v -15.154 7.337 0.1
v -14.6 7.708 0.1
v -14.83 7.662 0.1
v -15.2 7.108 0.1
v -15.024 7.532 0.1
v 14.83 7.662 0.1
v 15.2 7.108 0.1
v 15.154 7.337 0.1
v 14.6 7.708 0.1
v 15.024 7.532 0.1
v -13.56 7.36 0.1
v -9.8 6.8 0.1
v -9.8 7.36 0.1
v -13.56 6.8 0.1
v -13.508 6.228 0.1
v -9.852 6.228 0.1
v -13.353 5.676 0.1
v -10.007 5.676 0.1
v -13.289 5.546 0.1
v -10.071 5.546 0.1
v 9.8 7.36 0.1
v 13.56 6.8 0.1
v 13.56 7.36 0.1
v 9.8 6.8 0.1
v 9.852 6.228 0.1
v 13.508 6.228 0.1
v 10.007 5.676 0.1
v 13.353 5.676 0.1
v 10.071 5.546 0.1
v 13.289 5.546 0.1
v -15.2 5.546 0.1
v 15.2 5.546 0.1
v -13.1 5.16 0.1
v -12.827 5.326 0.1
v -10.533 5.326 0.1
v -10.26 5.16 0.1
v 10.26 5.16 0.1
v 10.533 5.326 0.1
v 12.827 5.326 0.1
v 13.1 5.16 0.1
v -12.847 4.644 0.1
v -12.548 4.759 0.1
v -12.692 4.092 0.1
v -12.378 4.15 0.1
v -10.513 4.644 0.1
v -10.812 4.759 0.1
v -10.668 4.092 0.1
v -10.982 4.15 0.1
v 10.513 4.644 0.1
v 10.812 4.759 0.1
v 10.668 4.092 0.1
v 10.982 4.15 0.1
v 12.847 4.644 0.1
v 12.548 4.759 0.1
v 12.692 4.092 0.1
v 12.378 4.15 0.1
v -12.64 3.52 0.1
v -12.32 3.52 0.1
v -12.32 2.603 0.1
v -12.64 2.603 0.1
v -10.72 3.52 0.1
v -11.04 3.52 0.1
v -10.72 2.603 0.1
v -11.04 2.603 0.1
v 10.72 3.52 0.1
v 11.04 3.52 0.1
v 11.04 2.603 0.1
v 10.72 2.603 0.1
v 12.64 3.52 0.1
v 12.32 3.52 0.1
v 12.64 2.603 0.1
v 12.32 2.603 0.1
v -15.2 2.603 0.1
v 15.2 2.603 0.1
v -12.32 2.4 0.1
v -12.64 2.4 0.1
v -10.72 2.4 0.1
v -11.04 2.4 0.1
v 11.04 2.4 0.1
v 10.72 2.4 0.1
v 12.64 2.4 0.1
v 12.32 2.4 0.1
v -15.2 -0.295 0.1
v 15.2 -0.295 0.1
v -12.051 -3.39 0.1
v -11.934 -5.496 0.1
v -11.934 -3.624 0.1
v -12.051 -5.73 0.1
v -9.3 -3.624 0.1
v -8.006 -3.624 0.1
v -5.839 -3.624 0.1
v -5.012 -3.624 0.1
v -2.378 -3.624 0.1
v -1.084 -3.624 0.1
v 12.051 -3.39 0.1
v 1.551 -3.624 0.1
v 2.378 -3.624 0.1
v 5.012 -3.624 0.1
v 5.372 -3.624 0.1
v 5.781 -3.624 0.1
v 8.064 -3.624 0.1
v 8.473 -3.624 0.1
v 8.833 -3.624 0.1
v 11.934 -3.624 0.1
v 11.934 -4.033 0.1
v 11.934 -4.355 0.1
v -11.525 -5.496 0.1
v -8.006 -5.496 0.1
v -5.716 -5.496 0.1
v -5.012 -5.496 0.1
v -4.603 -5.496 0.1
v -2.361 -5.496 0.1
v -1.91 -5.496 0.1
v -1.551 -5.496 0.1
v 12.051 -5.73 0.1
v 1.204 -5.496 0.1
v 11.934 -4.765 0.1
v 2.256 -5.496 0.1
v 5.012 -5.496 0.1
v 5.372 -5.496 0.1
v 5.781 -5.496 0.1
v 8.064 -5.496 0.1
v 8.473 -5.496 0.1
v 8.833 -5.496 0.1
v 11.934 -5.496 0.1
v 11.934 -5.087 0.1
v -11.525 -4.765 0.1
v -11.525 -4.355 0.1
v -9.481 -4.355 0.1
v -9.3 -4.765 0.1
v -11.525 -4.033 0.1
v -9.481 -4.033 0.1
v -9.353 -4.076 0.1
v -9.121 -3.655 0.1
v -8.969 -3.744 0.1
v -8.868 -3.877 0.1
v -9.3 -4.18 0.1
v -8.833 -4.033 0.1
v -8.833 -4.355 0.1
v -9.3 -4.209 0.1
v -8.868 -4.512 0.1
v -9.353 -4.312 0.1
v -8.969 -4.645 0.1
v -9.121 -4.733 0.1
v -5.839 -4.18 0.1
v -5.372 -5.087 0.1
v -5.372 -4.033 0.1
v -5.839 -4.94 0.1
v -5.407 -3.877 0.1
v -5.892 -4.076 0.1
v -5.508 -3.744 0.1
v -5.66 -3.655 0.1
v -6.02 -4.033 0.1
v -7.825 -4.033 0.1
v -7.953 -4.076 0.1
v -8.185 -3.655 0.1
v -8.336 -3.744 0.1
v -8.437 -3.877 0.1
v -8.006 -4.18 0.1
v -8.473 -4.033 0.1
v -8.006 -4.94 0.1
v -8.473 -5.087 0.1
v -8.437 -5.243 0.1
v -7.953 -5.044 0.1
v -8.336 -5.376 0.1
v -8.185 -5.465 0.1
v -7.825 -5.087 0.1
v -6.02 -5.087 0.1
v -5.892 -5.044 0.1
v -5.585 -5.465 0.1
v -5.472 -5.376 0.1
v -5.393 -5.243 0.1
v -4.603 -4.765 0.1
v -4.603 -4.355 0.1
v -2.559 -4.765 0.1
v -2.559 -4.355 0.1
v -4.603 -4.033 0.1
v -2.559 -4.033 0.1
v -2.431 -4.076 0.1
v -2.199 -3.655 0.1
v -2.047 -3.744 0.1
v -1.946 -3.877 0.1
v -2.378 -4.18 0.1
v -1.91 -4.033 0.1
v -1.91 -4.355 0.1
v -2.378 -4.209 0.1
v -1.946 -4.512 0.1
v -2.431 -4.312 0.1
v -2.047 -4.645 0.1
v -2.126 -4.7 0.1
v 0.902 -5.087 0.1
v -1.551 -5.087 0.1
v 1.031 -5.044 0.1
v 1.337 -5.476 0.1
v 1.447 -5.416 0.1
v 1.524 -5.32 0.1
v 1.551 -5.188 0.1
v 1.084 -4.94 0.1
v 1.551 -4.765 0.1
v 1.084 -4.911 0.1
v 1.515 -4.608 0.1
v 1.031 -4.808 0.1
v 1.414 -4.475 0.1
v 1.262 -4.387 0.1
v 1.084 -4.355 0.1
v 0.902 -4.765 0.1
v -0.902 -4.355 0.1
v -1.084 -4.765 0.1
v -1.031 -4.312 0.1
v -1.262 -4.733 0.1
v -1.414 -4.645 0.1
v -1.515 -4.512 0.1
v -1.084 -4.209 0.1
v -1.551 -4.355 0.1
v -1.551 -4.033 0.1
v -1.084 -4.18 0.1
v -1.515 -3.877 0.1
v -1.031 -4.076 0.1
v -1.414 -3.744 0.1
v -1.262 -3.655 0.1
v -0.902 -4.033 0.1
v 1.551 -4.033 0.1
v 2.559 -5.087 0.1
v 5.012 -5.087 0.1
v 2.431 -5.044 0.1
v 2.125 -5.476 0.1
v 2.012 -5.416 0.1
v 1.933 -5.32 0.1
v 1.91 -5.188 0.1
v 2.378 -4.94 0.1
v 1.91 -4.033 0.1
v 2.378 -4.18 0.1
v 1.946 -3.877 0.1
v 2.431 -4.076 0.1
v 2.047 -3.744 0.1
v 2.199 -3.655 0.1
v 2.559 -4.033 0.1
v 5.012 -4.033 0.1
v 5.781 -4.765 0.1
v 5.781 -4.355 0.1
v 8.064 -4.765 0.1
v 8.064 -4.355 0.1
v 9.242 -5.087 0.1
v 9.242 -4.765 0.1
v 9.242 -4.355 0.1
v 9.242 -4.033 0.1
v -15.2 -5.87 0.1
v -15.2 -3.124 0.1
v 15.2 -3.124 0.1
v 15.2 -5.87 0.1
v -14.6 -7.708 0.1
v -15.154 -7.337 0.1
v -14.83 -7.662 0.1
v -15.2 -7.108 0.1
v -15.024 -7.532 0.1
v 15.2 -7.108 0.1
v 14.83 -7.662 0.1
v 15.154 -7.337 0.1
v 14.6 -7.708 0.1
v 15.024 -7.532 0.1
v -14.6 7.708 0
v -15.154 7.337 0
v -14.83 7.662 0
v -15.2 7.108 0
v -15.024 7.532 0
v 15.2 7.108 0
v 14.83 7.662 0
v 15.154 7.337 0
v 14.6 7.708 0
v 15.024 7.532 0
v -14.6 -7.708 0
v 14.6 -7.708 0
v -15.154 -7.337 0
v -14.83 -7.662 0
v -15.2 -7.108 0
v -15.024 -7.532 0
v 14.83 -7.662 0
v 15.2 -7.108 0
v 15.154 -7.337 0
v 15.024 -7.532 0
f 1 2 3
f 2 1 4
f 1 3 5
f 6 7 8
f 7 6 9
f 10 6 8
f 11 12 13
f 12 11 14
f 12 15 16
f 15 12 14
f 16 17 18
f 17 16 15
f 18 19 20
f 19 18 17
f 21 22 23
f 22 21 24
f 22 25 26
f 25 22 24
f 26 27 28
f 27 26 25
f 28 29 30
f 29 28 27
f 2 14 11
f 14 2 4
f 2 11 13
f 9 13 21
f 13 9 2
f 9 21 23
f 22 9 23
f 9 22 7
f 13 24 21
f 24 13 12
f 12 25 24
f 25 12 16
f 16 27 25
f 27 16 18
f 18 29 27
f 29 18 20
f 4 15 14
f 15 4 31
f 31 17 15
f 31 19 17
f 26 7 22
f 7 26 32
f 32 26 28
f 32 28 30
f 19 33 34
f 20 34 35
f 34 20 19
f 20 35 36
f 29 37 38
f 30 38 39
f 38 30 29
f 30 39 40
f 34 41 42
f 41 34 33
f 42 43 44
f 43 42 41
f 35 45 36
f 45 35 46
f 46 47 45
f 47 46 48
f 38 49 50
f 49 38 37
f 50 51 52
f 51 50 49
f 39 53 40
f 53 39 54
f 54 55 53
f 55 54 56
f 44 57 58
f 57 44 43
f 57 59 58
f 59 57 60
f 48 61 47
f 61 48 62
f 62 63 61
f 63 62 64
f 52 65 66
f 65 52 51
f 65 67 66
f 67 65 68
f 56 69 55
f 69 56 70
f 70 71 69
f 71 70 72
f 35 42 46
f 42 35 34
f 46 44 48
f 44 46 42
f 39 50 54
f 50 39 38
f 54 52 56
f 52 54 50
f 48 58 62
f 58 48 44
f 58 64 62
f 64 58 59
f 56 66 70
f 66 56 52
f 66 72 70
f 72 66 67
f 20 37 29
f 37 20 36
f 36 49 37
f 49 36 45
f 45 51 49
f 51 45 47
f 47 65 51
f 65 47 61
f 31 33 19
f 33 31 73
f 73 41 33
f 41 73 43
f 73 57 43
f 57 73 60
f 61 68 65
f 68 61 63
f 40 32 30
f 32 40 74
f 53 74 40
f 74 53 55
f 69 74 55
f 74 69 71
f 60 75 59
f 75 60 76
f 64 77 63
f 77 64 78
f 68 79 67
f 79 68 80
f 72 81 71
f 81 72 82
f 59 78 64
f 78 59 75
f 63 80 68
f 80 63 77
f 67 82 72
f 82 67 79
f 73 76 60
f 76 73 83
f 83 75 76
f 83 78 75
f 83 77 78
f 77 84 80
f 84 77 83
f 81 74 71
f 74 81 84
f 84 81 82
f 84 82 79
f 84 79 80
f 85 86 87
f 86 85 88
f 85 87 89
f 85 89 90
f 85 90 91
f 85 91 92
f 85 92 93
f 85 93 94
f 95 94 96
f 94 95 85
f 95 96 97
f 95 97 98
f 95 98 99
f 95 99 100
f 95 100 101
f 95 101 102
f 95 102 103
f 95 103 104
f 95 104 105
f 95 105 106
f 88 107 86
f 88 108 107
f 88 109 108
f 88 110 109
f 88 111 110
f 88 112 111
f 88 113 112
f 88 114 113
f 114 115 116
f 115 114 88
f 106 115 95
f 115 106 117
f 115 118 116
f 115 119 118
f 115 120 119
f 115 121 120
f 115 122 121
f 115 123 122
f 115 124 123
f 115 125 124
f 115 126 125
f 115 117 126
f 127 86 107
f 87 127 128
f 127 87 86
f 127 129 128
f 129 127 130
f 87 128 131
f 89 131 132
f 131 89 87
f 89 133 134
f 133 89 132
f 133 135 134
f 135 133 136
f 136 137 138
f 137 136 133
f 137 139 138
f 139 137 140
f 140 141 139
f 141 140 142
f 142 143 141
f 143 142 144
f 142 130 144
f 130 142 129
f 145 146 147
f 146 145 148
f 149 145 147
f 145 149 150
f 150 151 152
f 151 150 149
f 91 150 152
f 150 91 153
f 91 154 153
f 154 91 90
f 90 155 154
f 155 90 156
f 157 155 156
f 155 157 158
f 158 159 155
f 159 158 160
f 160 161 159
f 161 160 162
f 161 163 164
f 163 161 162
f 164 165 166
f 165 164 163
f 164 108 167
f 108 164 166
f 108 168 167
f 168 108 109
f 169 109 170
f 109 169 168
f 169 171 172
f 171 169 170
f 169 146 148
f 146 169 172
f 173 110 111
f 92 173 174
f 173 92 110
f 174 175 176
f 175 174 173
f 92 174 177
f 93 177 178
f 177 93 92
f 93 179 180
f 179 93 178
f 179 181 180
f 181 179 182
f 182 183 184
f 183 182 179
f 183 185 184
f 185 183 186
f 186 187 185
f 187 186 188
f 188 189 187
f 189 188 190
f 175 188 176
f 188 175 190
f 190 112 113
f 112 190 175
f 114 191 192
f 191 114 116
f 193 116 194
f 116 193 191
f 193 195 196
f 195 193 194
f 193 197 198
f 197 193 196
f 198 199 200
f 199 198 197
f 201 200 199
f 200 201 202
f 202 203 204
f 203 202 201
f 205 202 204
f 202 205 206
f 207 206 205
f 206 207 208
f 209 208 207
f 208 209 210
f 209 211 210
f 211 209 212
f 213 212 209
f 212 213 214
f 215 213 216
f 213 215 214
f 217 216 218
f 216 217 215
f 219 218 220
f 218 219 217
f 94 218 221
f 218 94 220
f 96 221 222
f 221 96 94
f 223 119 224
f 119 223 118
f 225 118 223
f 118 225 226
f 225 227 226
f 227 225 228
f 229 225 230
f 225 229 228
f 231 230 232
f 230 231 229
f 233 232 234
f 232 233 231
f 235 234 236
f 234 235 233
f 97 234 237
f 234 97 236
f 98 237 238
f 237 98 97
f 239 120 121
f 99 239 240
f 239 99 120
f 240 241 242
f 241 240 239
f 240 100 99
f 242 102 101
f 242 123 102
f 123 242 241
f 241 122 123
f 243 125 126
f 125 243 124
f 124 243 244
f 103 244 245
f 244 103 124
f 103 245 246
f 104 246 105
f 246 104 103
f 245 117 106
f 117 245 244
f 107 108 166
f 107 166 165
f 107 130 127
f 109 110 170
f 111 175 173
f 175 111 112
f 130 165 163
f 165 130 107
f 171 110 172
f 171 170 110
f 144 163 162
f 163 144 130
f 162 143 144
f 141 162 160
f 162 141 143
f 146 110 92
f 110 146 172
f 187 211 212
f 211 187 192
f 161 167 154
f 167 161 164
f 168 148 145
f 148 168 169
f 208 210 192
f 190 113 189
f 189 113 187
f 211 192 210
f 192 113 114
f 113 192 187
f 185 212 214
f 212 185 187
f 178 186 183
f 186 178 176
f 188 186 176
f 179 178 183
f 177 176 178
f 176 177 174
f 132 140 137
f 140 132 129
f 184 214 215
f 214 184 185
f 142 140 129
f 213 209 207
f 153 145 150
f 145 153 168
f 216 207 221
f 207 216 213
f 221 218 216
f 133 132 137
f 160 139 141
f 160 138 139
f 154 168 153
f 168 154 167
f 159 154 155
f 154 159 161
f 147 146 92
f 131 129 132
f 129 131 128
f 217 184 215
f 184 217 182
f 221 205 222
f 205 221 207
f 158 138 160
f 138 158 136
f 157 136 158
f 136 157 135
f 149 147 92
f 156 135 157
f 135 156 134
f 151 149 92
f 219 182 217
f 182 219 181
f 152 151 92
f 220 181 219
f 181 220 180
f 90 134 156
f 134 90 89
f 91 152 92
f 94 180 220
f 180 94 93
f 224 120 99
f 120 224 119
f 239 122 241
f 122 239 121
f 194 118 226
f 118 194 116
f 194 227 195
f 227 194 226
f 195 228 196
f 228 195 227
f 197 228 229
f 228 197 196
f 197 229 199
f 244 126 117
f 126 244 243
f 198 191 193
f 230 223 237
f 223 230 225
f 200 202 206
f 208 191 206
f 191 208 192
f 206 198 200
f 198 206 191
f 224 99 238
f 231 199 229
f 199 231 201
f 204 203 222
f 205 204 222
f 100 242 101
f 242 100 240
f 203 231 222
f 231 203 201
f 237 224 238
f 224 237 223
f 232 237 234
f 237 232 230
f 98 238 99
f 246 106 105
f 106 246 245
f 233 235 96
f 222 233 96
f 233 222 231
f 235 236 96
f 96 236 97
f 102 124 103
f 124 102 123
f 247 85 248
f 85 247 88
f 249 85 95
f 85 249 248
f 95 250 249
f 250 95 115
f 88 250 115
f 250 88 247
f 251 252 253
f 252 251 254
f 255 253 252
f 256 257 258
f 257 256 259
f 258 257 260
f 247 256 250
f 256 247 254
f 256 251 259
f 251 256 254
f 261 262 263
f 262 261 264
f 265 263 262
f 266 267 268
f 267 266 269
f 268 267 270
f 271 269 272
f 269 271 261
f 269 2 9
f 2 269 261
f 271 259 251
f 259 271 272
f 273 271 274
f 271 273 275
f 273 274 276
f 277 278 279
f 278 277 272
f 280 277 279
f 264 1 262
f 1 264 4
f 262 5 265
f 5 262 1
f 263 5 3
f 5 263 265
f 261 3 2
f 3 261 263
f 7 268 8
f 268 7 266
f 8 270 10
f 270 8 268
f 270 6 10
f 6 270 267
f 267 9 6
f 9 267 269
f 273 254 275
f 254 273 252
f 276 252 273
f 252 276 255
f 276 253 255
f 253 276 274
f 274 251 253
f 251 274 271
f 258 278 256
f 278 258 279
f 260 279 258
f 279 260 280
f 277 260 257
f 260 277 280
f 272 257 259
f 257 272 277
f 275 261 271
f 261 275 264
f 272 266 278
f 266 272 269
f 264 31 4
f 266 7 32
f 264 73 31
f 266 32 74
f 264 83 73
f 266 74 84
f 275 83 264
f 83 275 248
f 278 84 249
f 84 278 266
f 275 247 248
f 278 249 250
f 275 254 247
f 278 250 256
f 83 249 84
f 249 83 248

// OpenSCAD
use <../lib.scad>
use <s/6148328ys01.scad>
use <s/6148328ys02.scad>
use <s/6148328ys03.scad>
use <s/6148328ys04.scad>
use <s/6148328ys05.scad>
use <s/6148328ys06.scad>
function ldraw_lib__6148328y() = [
// 0 Sticker  1.9 x  3.8 with Black Air Vents and White "PORSCHE" on Red Background (Needs Work)
// 0 Name: 6148328y.dat
// 0 Author: Massimo Maso [Sirio]
// 0 !LDRAW_ORG Part UPDATE 2023-05
// 0 !LICENSE Licensed under CC BY 4.0 : see CAreadme.txt
// 
// 0 !HELP Needs work: halftone areas in the air vents are simplified with dark red faces
// 
// 0 BFC CERTIFY CCW
  [0,"BFC","CERTIFY"],
  [0,"BFC","CCW"],
// 
// 0 !KEYWORDS 917K, Bricklink 75876stk01, Brickowl 852010, Pit Lane
// 0 !KEYWORDS Rebrickable 26357, set 75876, Speed Champions
// 
// 0 !HISTORY 2023-10-31 [OrionP] Official Update 2023-05
// 
// 
// 1 16 0 0 13.8765 1 0 0 0 1 0 0 0 1 s\6148328ys01.dat
  [1,16,0,0,13.8765,1,0,0,0,1,0,0,0,1, ldraw_lib__s__6148328ys01()],
// 1 16 0 0 13.8531 1 0 0 0 1 0 0 0 1 s\6148328ys02.dat
  [1,16,0,0,13.8531,1,0,0,0,1,0,0,0,1, ldraw_lib__s__6148328ys02()],
// 1 16 0 0 -.7237 1 0 0 0 1 0 0 0 1 s\6148328ys03.dat
  [1,16,0,0,-.7237,1,0,0,0,1,0,0,0,1, ldraw_lib__s__6148328ys03()],
// 1 16 0 0 -14.6604 1 0 0 0 1 0 0 0 1 s\6148328ys04.dat
  [1,16,0,0,-14.6604,1,0,0,0,1,0,0,0,1, ldraw_lib__s__6148328ys04()],
// 1 16 0 0 -14.6894 1 0 0 0 1 0 0 0 1 s\6148328ys05.dat
  [1,16,0,0,-14.6894,1,0,0,0,1,0,0,0,1, ldraw_lib__s__6148328ys05()],
// 1 16 0 0 0 1 0 0 0 1 0 0 0 1 s\6148328ys06.dat
  [1,16,0,0,0,1,0,0,0,1,0,0,0,1, ldraw_lib__s__6148328ys06()],
// 0 // Face
// 4 4 -38 -.25 -.7365 -38 -.25 -7.8105 38 -.25 -7.8105 38 -.25 -.7365
  [4,4,-38,-.25,-.7365,-38,-.25,-7.8105,38,-.25,-7.8105,38,-.25,-.7365],
];
module ldraw_lib__6148328y(step=0, col=false, unit=2/5, alt=false, line=0.2, solid=!$preview)
    makepoly(ldraw_lib__6148328y(), step=step, col=col, unit=unit, alt=alt, line=line, solid=solid);
ldraw_lib__6148328y(line=0.2);
